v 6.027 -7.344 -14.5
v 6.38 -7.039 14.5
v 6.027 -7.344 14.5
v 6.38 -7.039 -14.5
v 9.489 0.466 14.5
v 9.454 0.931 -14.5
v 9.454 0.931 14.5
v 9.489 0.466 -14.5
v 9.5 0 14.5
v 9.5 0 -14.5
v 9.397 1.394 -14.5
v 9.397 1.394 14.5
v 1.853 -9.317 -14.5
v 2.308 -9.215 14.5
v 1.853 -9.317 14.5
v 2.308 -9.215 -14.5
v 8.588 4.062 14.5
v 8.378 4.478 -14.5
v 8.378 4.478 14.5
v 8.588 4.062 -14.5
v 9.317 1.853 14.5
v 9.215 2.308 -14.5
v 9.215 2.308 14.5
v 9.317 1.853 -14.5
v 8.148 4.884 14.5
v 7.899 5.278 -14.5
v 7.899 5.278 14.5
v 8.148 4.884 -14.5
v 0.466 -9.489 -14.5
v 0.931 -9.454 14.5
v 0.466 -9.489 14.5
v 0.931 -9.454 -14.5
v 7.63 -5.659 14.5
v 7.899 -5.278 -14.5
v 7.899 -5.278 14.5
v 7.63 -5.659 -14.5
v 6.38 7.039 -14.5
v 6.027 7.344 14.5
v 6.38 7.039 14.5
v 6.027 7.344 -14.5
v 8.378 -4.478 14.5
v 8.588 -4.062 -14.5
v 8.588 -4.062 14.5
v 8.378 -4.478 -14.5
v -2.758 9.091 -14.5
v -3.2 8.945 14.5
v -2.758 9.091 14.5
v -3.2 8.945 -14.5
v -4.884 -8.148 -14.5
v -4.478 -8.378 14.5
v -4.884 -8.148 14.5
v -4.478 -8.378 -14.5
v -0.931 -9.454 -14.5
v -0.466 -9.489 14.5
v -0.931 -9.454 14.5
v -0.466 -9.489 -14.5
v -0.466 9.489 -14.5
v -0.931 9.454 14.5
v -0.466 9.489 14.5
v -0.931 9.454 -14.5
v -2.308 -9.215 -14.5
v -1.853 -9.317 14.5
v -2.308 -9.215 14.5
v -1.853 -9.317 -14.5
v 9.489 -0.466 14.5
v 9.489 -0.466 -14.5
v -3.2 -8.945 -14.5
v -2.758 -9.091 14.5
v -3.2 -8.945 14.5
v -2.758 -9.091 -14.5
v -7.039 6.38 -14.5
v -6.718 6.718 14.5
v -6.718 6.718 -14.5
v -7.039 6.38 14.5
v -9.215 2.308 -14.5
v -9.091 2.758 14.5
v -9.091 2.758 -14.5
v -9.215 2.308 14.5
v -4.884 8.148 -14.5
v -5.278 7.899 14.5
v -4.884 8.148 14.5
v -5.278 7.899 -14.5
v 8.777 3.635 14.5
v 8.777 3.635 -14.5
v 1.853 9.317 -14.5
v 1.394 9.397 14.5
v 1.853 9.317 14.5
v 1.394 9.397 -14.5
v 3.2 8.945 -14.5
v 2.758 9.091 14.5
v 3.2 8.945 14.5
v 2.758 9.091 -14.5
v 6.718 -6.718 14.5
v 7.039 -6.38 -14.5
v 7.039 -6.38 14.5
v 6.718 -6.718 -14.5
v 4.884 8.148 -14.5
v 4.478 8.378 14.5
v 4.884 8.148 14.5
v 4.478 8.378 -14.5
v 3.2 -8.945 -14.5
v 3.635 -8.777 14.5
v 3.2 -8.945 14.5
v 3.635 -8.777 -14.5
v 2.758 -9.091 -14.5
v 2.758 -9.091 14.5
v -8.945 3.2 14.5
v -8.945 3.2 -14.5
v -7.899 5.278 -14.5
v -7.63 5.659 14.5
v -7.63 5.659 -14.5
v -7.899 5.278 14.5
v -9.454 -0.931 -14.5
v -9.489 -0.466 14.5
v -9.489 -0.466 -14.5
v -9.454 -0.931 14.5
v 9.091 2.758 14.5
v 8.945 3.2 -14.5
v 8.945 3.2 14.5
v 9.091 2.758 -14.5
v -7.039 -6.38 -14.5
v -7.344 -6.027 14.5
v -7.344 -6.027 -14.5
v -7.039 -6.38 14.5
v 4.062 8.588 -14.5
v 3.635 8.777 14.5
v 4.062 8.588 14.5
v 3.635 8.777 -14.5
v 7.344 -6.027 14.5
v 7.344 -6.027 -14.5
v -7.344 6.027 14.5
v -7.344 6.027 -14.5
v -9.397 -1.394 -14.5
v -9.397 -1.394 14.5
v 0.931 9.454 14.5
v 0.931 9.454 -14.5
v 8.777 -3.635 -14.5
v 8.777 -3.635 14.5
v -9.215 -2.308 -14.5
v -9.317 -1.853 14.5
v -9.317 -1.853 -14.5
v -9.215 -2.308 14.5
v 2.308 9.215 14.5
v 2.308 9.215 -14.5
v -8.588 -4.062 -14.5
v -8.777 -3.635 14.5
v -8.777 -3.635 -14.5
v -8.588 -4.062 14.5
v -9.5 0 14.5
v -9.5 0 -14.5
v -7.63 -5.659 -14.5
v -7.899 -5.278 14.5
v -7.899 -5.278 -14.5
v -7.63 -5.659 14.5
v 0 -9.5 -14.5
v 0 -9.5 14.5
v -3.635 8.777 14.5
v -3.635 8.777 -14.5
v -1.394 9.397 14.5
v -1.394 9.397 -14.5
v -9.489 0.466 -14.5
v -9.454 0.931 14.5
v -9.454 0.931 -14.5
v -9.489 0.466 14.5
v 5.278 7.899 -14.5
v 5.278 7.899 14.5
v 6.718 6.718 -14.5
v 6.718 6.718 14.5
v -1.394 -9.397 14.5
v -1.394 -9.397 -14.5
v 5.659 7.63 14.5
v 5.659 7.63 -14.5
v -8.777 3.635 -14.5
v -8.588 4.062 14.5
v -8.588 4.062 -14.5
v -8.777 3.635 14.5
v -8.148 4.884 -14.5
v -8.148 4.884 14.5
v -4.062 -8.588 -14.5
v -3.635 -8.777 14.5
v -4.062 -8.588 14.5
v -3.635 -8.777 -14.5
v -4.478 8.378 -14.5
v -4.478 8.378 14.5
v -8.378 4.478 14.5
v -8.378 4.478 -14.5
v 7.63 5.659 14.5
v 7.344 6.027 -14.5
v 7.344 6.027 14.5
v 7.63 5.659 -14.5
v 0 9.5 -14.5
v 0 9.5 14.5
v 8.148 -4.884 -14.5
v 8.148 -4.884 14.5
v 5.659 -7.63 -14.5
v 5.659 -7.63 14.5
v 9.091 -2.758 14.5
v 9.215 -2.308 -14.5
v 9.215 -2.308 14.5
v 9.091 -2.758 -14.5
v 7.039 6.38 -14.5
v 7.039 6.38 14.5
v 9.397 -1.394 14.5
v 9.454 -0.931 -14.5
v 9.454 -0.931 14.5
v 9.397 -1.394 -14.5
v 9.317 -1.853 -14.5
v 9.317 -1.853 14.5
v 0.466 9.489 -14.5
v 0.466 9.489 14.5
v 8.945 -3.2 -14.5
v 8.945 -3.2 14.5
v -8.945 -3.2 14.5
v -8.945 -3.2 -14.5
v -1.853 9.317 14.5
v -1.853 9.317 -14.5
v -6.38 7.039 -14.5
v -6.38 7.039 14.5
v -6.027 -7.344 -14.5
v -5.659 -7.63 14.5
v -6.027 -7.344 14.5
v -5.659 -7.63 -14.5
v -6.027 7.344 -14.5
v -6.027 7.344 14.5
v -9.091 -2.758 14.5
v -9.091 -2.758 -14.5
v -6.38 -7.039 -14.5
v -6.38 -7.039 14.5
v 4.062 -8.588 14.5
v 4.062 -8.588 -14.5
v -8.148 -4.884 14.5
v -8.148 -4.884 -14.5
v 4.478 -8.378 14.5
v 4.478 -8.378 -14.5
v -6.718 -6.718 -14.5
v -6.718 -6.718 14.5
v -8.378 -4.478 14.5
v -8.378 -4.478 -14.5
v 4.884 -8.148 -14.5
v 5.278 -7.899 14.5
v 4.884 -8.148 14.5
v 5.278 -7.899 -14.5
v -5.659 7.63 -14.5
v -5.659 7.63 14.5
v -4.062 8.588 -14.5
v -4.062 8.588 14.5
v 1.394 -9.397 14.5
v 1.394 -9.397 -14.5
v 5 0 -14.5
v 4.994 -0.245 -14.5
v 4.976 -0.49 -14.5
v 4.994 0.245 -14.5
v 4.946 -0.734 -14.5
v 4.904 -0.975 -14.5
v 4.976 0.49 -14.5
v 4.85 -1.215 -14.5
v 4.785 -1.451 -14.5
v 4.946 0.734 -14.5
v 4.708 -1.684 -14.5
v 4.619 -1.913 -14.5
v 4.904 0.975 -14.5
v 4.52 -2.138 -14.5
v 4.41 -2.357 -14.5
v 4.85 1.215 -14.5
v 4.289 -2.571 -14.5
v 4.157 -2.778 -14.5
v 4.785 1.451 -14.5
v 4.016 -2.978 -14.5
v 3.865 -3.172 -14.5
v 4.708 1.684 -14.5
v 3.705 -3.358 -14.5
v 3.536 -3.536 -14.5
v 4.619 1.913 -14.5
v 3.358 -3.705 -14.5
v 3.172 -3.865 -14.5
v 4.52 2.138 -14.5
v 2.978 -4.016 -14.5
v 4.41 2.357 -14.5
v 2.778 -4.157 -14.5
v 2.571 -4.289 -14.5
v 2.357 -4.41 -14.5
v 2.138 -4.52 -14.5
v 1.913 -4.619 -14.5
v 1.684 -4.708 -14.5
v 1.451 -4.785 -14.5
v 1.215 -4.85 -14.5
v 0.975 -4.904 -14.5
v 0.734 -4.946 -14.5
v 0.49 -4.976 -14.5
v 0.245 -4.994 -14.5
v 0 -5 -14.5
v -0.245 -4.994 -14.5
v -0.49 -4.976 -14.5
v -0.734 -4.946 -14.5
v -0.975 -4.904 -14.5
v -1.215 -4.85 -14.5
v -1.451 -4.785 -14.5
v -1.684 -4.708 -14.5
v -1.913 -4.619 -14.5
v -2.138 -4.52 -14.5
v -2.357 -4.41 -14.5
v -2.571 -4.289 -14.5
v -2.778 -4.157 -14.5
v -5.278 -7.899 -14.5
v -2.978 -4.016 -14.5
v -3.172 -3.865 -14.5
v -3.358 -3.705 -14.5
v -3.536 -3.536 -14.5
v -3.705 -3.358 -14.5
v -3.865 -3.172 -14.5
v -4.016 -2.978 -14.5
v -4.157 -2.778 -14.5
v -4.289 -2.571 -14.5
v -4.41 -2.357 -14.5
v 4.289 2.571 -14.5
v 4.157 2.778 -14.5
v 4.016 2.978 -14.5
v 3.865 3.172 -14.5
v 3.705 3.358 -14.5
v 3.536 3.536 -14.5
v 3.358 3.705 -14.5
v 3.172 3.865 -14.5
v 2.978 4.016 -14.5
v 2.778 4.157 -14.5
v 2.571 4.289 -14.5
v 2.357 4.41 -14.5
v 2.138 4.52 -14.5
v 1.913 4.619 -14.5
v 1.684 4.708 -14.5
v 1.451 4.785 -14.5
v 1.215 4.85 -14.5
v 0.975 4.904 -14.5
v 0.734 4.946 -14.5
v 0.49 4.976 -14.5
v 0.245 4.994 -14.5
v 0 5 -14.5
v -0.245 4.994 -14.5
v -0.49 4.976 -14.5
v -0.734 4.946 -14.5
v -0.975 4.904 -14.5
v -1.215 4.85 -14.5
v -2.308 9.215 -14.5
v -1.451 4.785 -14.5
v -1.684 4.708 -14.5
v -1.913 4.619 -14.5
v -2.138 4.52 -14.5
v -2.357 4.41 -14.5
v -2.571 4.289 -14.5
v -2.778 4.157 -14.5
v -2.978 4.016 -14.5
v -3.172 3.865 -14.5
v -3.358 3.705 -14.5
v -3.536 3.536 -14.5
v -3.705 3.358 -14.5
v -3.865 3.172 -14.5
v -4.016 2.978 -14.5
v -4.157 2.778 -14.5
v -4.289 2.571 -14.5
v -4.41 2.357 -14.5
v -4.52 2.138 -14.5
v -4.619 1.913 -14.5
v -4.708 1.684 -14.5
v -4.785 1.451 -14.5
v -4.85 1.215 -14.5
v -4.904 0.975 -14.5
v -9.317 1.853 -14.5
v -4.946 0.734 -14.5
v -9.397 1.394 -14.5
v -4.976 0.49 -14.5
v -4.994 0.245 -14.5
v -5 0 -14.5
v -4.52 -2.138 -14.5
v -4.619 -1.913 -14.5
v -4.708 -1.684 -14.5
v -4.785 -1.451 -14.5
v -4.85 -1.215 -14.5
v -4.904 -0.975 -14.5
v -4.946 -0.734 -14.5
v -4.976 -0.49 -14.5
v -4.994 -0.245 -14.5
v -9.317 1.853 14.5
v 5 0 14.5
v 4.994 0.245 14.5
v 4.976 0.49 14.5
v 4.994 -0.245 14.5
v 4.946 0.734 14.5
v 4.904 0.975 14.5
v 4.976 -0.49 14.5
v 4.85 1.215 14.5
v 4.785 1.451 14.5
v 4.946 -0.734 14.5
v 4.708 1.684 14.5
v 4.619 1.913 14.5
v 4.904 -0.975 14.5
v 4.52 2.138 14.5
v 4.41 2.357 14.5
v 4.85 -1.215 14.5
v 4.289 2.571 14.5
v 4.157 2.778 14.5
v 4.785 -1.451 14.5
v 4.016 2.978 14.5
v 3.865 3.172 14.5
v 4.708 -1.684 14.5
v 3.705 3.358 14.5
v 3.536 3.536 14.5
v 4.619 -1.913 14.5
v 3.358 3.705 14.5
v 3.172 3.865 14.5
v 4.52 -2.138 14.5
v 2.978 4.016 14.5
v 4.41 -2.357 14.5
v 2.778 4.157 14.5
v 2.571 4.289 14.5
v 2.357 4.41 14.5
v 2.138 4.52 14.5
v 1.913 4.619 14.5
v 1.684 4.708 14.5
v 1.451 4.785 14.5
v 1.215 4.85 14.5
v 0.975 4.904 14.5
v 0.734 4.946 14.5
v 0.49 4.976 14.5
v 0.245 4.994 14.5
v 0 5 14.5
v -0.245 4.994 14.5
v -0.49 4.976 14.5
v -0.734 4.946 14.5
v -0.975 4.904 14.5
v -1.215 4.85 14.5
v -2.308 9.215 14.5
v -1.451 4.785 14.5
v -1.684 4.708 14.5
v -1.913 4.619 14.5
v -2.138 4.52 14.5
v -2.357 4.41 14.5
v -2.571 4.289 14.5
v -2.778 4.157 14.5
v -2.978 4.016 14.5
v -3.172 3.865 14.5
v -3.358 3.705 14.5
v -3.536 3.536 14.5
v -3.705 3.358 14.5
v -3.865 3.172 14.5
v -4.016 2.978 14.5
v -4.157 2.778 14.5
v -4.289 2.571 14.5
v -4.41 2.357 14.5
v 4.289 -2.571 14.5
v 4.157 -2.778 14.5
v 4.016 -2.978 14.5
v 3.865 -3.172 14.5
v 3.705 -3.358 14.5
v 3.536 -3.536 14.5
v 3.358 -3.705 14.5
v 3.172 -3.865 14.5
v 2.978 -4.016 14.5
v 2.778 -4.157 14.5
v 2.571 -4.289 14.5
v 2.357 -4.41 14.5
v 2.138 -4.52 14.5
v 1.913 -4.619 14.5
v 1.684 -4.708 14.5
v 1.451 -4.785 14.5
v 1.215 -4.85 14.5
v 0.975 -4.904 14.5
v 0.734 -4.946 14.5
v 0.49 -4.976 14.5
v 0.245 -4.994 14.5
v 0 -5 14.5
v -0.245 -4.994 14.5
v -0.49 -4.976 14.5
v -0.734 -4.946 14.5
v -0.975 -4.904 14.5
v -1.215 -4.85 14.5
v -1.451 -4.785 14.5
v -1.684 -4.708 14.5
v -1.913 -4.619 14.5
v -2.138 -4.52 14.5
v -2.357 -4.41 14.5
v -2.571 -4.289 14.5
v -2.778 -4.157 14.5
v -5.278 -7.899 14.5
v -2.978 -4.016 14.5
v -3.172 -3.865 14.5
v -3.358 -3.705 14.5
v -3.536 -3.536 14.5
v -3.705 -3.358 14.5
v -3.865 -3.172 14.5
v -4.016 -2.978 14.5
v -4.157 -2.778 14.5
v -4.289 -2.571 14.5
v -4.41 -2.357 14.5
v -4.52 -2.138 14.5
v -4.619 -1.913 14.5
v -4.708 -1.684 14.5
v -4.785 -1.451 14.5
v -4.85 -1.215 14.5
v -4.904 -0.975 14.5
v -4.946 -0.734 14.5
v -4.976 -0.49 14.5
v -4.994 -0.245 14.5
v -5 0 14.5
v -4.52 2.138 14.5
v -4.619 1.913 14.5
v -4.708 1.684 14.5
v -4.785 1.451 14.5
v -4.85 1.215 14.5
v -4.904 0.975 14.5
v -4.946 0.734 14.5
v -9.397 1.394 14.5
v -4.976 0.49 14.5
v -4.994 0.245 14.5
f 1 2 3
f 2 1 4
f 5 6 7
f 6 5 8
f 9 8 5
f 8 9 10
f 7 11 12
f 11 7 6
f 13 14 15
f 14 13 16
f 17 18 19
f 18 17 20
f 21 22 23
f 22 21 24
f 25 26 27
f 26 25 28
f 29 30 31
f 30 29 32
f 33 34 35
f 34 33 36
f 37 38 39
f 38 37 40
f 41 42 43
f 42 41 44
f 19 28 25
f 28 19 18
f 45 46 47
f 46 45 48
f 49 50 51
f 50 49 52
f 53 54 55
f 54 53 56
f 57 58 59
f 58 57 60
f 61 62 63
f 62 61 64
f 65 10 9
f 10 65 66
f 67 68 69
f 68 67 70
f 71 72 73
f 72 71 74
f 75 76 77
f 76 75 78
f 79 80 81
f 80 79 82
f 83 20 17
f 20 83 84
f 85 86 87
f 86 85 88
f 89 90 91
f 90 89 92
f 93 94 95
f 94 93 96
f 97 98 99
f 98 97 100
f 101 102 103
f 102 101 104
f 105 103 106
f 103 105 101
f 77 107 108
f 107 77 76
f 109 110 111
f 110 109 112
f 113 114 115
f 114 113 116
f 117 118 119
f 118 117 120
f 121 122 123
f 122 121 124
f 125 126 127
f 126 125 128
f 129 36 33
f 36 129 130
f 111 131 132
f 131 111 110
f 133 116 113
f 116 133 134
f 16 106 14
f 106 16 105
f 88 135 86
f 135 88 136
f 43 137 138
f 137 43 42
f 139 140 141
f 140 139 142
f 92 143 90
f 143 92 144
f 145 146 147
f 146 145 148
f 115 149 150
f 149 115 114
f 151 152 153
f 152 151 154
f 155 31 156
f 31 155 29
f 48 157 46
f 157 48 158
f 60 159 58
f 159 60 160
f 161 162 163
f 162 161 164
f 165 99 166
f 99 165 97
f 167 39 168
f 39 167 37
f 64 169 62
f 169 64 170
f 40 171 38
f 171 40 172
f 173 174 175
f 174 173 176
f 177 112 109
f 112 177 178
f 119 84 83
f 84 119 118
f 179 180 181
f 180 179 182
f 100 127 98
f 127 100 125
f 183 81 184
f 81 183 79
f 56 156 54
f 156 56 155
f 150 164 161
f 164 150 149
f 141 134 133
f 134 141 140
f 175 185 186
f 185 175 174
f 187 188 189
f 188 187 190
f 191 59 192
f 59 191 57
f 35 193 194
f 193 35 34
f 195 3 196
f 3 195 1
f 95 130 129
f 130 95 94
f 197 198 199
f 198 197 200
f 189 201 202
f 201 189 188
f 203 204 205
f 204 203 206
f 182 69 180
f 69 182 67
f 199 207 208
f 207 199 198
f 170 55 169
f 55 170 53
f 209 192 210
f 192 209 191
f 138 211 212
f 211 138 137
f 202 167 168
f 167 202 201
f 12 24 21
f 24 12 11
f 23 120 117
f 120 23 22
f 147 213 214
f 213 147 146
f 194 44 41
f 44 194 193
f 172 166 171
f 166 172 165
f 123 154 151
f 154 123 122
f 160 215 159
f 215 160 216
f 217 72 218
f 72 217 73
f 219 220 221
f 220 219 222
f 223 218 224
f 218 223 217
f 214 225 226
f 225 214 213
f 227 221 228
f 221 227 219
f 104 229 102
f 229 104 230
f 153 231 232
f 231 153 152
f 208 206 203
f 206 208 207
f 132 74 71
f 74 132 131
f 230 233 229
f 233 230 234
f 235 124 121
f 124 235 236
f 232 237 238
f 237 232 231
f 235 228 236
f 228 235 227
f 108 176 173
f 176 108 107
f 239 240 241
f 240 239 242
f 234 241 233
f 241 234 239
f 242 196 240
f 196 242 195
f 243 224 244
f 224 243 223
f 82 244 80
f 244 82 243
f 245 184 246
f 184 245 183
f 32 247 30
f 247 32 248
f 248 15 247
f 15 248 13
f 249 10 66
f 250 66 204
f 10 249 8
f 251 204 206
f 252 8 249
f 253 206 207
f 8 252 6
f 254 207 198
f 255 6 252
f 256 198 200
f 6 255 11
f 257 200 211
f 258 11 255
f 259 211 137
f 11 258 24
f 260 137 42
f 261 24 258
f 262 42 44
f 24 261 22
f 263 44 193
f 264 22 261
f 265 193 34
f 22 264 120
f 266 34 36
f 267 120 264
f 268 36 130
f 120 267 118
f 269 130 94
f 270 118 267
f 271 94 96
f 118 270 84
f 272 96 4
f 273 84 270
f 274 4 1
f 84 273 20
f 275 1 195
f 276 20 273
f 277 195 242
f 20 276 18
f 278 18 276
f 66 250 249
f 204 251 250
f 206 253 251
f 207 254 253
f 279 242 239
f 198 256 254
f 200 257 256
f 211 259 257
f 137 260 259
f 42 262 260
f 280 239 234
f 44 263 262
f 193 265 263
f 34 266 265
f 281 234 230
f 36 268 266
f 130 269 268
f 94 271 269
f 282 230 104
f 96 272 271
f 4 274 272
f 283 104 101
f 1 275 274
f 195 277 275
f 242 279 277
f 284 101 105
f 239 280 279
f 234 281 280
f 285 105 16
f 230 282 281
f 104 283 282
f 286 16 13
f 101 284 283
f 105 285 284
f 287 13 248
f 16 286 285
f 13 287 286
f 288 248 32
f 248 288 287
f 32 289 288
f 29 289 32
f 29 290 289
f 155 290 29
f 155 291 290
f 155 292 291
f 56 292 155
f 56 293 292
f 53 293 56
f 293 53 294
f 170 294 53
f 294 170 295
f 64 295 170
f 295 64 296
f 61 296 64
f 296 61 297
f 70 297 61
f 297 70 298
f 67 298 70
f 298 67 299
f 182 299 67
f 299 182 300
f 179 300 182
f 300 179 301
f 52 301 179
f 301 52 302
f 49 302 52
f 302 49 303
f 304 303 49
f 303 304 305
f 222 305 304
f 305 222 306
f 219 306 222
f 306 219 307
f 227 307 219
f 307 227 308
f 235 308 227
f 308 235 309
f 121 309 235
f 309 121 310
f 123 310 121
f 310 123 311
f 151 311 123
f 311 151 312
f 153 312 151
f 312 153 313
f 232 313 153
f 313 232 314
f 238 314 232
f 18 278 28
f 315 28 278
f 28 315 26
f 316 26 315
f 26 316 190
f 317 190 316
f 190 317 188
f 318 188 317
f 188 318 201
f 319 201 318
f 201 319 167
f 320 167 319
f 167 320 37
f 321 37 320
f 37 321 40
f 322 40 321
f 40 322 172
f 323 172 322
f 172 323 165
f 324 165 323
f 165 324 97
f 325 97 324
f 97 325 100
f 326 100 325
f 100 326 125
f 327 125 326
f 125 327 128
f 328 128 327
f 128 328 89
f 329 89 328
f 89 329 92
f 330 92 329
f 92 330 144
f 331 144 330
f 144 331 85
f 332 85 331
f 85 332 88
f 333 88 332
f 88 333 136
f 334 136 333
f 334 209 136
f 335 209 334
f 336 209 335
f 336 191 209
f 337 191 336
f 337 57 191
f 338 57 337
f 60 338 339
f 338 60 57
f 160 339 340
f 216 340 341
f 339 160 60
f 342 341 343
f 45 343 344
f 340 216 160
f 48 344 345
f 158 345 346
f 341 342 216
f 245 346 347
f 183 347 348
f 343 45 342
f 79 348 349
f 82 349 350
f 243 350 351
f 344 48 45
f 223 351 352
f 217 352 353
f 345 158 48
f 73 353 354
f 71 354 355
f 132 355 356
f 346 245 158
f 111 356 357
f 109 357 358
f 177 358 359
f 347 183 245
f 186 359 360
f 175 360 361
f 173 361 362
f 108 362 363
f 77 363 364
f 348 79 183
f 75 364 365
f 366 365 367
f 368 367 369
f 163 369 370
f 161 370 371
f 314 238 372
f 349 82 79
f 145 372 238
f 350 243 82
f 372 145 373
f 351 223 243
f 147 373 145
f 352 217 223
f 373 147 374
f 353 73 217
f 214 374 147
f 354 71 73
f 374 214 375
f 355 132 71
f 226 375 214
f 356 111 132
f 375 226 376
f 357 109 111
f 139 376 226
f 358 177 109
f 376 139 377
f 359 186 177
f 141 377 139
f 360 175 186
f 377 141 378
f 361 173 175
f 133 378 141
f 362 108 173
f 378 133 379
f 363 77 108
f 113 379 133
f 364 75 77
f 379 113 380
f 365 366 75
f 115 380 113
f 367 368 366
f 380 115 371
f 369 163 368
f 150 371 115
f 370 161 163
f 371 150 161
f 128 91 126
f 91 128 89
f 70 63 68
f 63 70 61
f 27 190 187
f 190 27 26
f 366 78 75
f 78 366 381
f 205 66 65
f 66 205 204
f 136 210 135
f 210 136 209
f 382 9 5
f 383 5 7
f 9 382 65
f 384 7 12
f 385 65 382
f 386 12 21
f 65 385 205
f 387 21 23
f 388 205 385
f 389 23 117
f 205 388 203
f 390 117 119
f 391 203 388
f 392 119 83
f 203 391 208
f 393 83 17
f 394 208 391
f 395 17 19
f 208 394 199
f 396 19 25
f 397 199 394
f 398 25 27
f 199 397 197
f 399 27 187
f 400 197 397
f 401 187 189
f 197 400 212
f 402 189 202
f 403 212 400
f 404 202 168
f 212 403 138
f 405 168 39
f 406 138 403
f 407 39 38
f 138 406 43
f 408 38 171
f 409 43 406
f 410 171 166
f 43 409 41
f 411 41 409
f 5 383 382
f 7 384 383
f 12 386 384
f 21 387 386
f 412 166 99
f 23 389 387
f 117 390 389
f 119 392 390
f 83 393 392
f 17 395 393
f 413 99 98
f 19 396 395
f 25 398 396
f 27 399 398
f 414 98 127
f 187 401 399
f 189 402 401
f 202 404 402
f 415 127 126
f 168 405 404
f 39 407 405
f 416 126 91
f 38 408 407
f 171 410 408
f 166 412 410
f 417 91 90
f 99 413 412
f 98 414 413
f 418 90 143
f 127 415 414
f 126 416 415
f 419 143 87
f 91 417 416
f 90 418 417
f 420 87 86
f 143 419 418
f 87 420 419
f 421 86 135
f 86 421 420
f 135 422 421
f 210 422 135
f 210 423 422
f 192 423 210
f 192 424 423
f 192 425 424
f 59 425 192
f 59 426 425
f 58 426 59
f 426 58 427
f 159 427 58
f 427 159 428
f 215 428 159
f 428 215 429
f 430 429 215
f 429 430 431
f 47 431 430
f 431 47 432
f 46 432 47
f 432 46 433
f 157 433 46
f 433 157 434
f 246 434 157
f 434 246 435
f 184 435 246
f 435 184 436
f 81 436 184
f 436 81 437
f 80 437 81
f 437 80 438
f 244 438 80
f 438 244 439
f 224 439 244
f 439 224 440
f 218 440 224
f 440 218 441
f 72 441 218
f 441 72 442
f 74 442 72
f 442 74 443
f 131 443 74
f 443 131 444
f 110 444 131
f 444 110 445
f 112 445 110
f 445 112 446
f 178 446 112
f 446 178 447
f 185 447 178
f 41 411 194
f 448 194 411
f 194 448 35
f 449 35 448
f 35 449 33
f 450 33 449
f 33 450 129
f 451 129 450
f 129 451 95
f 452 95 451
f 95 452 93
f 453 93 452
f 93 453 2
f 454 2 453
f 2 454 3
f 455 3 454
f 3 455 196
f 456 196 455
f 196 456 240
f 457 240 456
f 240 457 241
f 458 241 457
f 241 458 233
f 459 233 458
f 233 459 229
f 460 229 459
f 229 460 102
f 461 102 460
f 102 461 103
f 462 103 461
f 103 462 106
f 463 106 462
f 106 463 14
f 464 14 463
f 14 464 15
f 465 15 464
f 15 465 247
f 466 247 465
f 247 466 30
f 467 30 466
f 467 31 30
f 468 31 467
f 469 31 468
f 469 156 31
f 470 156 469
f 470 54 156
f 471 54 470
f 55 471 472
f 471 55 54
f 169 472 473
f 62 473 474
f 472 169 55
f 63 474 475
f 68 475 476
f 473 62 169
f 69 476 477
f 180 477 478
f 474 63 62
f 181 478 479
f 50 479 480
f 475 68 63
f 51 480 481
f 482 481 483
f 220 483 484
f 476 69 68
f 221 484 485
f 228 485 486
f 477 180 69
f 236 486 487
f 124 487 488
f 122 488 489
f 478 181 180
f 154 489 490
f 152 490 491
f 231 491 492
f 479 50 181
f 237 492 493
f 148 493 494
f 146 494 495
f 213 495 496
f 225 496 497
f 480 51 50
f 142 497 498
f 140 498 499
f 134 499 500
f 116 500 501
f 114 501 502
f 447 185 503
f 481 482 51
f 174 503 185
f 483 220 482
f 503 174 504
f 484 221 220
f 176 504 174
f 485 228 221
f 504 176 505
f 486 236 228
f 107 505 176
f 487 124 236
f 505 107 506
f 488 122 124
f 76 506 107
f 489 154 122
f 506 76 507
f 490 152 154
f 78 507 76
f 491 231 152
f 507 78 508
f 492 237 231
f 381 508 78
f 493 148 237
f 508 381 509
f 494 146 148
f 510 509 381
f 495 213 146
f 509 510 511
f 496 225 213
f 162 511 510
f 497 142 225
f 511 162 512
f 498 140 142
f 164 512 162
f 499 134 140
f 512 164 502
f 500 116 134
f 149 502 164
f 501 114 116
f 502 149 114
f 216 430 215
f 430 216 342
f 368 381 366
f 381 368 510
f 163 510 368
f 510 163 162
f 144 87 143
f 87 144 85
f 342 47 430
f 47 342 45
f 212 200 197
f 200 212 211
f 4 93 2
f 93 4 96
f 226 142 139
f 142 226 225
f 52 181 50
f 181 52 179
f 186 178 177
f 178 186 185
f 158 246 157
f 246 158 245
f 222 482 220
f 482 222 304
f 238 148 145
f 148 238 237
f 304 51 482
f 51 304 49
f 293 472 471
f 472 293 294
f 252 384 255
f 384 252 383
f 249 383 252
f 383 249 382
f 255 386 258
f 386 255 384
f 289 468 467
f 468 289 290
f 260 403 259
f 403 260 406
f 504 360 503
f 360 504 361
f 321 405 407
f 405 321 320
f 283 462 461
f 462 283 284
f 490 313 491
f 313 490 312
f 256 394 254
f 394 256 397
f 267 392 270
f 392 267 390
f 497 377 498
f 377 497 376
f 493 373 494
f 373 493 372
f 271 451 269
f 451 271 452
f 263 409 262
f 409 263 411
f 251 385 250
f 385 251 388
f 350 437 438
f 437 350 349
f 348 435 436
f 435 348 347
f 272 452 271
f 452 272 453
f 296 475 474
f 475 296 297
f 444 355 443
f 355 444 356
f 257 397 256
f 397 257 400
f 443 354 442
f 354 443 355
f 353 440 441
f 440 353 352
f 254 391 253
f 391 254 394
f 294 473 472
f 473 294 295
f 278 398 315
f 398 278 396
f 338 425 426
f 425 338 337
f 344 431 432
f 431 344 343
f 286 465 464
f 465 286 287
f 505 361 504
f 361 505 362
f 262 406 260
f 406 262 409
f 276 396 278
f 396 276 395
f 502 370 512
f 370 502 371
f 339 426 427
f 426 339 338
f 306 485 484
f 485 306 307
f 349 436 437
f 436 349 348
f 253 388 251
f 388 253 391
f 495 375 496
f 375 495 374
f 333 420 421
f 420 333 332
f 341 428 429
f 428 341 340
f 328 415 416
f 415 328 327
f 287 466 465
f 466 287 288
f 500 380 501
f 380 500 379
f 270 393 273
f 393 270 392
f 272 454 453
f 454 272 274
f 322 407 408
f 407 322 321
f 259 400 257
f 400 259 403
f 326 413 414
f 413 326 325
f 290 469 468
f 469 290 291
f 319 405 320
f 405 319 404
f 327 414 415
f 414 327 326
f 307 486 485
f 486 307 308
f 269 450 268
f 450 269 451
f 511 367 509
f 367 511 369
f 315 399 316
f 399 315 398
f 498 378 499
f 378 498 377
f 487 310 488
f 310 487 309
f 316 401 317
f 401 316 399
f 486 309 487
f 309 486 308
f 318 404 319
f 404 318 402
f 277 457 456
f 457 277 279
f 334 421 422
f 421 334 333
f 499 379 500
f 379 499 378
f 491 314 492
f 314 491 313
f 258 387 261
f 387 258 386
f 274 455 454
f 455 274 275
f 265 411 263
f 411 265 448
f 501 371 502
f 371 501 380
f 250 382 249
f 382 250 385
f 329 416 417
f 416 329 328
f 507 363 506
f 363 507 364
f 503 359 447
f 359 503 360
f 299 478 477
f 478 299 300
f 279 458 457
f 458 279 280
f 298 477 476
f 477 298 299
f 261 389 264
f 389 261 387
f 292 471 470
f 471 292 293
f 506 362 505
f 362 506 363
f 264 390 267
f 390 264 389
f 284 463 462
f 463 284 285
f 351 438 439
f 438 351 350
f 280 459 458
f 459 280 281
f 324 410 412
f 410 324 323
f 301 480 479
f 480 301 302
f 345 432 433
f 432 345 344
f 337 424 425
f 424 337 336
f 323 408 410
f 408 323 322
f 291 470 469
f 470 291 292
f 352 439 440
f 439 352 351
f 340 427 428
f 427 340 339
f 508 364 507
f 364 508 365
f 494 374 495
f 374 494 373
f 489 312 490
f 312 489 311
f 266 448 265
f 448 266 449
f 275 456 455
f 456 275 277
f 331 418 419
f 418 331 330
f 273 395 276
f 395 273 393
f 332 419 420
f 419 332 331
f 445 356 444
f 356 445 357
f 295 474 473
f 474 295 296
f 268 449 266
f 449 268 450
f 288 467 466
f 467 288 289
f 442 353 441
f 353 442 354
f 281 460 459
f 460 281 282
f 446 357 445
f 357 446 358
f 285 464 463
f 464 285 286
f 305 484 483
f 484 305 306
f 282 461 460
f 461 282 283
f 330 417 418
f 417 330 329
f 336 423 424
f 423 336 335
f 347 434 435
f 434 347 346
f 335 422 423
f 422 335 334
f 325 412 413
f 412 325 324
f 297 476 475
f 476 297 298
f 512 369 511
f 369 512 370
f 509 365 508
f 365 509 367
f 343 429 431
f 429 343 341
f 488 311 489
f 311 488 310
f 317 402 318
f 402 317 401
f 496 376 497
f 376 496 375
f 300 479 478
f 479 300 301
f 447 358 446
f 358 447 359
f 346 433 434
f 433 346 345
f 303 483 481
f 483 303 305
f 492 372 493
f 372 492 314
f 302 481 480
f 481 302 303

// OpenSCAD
$fn=128;

bore_d = 10.0;
od_d = 19.0;
len = 29.0;

module linear_bearing(bore_d, od_d, len) {
    difference() {
        cylinder(d=od_d, h=len, center=true);
        cylinder(d=bore_d, h=len+0.4, center=true);
    }
}

linear_bearing(bore_d, od_d, len);
